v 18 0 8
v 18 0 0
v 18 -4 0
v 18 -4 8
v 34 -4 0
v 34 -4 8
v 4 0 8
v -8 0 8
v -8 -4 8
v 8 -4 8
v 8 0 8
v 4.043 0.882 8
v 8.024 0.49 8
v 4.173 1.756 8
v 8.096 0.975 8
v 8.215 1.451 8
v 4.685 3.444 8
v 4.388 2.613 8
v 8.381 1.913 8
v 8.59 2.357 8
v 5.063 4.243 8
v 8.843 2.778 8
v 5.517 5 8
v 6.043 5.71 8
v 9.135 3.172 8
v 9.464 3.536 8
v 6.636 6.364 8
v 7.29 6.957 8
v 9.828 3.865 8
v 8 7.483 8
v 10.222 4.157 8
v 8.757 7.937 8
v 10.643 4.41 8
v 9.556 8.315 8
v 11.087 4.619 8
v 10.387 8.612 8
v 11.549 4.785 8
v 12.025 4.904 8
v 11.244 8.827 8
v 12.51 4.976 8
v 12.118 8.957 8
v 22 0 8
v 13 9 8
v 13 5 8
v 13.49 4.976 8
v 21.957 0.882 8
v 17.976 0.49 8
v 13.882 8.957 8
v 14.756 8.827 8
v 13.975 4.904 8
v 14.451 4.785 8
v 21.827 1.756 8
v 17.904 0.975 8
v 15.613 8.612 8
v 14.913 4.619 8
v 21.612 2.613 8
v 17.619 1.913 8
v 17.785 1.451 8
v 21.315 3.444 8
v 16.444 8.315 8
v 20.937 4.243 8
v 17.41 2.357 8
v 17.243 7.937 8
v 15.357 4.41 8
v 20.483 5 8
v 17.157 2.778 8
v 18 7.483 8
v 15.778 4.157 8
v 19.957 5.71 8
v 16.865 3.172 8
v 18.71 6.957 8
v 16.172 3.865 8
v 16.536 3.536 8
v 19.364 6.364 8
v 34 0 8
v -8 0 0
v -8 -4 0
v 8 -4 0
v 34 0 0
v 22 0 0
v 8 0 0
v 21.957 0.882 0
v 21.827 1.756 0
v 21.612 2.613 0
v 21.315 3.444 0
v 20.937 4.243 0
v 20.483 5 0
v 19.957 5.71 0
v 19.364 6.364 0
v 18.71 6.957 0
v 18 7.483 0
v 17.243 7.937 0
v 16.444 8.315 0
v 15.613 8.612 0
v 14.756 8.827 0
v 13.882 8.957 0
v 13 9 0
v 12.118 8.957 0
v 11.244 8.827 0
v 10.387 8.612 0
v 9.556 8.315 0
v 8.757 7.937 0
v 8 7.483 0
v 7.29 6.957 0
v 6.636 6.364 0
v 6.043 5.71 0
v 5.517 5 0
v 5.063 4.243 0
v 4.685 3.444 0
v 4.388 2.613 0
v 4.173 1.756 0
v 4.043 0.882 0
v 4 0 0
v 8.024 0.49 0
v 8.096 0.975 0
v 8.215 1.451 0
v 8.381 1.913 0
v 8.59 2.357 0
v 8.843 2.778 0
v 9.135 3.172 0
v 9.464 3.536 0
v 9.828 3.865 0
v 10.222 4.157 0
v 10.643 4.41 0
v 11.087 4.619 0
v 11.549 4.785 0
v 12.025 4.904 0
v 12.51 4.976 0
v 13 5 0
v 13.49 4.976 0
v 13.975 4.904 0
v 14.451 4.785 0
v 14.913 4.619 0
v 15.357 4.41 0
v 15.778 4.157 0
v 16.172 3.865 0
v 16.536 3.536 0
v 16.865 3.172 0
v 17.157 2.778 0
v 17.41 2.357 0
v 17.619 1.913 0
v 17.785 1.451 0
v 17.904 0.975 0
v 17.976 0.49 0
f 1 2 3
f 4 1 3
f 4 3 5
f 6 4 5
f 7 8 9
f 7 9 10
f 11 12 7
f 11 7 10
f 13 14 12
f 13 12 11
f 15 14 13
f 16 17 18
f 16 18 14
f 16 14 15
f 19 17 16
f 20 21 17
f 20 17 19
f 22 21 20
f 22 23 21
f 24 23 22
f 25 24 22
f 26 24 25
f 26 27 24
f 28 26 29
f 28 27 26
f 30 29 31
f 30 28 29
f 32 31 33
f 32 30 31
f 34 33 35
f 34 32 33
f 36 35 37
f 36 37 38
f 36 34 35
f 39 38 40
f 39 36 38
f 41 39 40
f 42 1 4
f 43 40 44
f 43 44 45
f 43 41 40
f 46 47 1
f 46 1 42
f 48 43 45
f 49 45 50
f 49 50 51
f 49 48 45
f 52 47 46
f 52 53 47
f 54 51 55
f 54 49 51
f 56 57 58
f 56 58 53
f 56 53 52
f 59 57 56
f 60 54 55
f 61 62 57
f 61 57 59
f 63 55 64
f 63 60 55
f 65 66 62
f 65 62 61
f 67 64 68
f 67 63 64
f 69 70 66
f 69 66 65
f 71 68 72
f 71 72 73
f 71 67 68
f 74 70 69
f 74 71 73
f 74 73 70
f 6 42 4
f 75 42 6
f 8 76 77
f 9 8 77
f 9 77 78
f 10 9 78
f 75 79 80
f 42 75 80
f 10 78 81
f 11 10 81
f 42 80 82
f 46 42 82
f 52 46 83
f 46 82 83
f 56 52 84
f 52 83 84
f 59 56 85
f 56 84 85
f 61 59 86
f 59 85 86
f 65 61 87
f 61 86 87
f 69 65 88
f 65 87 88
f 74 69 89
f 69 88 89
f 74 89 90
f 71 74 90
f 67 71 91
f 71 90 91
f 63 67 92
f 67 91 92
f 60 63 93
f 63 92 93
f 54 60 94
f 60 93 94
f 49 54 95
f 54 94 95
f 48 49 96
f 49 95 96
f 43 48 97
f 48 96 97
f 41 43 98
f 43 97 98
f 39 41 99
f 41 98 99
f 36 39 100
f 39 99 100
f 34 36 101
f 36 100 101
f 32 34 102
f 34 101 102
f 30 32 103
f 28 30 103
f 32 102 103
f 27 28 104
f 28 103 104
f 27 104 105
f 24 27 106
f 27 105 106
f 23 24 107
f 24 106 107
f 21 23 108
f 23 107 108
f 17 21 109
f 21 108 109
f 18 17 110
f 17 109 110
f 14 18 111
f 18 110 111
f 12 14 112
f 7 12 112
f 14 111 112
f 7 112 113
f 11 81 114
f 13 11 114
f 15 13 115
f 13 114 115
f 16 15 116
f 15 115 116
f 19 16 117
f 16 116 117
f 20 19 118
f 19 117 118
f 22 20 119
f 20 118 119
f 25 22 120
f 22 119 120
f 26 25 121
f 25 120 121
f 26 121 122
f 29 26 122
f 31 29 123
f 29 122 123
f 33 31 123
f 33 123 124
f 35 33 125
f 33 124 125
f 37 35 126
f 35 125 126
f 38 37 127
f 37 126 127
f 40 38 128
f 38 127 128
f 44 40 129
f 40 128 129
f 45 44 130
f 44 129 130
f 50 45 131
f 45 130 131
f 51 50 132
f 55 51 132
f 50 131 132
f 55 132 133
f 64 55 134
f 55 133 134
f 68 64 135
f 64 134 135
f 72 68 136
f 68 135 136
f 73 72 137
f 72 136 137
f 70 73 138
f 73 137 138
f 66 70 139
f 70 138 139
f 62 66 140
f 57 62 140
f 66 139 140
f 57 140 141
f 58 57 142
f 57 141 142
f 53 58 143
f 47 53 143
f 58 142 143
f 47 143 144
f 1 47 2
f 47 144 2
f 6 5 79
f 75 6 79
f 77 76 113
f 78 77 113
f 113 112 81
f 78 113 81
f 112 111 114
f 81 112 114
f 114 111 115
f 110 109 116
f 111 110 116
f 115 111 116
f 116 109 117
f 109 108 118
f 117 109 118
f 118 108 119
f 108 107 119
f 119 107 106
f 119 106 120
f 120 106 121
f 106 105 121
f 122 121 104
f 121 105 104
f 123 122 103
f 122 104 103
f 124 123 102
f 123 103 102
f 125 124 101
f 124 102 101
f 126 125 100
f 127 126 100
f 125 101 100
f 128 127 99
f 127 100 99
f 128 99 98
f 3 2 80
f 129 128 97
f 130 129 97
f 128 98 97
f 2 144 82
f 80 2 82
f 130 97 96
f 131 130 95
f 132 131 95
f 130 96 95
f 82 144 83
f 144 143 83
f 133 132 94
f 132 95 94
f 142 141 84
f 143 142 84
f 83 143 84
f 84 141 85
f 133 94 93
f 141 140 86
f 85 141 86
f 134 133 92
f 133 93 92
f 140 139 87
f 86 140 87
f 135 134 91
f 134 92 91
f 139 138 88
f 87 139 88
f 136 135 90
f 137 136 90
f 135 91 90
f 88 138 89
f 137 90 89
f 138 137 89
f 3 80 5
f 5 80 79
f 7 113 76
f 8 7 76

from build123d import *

# Parameters (mm, degrees)
BOSS_EXTRUDE1_DEPTH = 8


with BuildPart() as part:
    # Sketch2 → Boss-Extrude1 (new body)
    with BuildSketch(Plane.XY):
        with BuildLine():
            Line((0, -4), (8, -4))
            Line((8, -4), (8, 0))
            ThreePointArc((8, 0), (13, 5), (18, 0))
            Line((18, 0), (18, -4))
            Line((18, -4), (34, -4))
            Line((34, -4), (34, 0))
            Line((34, 0), (22, 0))
            ThreePointArc((22, 0), (13, 9), (4, 0))
            Line((4, 0), (-8, 0))
            Line((-8, 0), (-8, -4))
            Line((-8, -4), (0, -4))
        make_face()
    extrude(amount=BOSS_EXTRUDE1_DEPTH)


solid = part.part
